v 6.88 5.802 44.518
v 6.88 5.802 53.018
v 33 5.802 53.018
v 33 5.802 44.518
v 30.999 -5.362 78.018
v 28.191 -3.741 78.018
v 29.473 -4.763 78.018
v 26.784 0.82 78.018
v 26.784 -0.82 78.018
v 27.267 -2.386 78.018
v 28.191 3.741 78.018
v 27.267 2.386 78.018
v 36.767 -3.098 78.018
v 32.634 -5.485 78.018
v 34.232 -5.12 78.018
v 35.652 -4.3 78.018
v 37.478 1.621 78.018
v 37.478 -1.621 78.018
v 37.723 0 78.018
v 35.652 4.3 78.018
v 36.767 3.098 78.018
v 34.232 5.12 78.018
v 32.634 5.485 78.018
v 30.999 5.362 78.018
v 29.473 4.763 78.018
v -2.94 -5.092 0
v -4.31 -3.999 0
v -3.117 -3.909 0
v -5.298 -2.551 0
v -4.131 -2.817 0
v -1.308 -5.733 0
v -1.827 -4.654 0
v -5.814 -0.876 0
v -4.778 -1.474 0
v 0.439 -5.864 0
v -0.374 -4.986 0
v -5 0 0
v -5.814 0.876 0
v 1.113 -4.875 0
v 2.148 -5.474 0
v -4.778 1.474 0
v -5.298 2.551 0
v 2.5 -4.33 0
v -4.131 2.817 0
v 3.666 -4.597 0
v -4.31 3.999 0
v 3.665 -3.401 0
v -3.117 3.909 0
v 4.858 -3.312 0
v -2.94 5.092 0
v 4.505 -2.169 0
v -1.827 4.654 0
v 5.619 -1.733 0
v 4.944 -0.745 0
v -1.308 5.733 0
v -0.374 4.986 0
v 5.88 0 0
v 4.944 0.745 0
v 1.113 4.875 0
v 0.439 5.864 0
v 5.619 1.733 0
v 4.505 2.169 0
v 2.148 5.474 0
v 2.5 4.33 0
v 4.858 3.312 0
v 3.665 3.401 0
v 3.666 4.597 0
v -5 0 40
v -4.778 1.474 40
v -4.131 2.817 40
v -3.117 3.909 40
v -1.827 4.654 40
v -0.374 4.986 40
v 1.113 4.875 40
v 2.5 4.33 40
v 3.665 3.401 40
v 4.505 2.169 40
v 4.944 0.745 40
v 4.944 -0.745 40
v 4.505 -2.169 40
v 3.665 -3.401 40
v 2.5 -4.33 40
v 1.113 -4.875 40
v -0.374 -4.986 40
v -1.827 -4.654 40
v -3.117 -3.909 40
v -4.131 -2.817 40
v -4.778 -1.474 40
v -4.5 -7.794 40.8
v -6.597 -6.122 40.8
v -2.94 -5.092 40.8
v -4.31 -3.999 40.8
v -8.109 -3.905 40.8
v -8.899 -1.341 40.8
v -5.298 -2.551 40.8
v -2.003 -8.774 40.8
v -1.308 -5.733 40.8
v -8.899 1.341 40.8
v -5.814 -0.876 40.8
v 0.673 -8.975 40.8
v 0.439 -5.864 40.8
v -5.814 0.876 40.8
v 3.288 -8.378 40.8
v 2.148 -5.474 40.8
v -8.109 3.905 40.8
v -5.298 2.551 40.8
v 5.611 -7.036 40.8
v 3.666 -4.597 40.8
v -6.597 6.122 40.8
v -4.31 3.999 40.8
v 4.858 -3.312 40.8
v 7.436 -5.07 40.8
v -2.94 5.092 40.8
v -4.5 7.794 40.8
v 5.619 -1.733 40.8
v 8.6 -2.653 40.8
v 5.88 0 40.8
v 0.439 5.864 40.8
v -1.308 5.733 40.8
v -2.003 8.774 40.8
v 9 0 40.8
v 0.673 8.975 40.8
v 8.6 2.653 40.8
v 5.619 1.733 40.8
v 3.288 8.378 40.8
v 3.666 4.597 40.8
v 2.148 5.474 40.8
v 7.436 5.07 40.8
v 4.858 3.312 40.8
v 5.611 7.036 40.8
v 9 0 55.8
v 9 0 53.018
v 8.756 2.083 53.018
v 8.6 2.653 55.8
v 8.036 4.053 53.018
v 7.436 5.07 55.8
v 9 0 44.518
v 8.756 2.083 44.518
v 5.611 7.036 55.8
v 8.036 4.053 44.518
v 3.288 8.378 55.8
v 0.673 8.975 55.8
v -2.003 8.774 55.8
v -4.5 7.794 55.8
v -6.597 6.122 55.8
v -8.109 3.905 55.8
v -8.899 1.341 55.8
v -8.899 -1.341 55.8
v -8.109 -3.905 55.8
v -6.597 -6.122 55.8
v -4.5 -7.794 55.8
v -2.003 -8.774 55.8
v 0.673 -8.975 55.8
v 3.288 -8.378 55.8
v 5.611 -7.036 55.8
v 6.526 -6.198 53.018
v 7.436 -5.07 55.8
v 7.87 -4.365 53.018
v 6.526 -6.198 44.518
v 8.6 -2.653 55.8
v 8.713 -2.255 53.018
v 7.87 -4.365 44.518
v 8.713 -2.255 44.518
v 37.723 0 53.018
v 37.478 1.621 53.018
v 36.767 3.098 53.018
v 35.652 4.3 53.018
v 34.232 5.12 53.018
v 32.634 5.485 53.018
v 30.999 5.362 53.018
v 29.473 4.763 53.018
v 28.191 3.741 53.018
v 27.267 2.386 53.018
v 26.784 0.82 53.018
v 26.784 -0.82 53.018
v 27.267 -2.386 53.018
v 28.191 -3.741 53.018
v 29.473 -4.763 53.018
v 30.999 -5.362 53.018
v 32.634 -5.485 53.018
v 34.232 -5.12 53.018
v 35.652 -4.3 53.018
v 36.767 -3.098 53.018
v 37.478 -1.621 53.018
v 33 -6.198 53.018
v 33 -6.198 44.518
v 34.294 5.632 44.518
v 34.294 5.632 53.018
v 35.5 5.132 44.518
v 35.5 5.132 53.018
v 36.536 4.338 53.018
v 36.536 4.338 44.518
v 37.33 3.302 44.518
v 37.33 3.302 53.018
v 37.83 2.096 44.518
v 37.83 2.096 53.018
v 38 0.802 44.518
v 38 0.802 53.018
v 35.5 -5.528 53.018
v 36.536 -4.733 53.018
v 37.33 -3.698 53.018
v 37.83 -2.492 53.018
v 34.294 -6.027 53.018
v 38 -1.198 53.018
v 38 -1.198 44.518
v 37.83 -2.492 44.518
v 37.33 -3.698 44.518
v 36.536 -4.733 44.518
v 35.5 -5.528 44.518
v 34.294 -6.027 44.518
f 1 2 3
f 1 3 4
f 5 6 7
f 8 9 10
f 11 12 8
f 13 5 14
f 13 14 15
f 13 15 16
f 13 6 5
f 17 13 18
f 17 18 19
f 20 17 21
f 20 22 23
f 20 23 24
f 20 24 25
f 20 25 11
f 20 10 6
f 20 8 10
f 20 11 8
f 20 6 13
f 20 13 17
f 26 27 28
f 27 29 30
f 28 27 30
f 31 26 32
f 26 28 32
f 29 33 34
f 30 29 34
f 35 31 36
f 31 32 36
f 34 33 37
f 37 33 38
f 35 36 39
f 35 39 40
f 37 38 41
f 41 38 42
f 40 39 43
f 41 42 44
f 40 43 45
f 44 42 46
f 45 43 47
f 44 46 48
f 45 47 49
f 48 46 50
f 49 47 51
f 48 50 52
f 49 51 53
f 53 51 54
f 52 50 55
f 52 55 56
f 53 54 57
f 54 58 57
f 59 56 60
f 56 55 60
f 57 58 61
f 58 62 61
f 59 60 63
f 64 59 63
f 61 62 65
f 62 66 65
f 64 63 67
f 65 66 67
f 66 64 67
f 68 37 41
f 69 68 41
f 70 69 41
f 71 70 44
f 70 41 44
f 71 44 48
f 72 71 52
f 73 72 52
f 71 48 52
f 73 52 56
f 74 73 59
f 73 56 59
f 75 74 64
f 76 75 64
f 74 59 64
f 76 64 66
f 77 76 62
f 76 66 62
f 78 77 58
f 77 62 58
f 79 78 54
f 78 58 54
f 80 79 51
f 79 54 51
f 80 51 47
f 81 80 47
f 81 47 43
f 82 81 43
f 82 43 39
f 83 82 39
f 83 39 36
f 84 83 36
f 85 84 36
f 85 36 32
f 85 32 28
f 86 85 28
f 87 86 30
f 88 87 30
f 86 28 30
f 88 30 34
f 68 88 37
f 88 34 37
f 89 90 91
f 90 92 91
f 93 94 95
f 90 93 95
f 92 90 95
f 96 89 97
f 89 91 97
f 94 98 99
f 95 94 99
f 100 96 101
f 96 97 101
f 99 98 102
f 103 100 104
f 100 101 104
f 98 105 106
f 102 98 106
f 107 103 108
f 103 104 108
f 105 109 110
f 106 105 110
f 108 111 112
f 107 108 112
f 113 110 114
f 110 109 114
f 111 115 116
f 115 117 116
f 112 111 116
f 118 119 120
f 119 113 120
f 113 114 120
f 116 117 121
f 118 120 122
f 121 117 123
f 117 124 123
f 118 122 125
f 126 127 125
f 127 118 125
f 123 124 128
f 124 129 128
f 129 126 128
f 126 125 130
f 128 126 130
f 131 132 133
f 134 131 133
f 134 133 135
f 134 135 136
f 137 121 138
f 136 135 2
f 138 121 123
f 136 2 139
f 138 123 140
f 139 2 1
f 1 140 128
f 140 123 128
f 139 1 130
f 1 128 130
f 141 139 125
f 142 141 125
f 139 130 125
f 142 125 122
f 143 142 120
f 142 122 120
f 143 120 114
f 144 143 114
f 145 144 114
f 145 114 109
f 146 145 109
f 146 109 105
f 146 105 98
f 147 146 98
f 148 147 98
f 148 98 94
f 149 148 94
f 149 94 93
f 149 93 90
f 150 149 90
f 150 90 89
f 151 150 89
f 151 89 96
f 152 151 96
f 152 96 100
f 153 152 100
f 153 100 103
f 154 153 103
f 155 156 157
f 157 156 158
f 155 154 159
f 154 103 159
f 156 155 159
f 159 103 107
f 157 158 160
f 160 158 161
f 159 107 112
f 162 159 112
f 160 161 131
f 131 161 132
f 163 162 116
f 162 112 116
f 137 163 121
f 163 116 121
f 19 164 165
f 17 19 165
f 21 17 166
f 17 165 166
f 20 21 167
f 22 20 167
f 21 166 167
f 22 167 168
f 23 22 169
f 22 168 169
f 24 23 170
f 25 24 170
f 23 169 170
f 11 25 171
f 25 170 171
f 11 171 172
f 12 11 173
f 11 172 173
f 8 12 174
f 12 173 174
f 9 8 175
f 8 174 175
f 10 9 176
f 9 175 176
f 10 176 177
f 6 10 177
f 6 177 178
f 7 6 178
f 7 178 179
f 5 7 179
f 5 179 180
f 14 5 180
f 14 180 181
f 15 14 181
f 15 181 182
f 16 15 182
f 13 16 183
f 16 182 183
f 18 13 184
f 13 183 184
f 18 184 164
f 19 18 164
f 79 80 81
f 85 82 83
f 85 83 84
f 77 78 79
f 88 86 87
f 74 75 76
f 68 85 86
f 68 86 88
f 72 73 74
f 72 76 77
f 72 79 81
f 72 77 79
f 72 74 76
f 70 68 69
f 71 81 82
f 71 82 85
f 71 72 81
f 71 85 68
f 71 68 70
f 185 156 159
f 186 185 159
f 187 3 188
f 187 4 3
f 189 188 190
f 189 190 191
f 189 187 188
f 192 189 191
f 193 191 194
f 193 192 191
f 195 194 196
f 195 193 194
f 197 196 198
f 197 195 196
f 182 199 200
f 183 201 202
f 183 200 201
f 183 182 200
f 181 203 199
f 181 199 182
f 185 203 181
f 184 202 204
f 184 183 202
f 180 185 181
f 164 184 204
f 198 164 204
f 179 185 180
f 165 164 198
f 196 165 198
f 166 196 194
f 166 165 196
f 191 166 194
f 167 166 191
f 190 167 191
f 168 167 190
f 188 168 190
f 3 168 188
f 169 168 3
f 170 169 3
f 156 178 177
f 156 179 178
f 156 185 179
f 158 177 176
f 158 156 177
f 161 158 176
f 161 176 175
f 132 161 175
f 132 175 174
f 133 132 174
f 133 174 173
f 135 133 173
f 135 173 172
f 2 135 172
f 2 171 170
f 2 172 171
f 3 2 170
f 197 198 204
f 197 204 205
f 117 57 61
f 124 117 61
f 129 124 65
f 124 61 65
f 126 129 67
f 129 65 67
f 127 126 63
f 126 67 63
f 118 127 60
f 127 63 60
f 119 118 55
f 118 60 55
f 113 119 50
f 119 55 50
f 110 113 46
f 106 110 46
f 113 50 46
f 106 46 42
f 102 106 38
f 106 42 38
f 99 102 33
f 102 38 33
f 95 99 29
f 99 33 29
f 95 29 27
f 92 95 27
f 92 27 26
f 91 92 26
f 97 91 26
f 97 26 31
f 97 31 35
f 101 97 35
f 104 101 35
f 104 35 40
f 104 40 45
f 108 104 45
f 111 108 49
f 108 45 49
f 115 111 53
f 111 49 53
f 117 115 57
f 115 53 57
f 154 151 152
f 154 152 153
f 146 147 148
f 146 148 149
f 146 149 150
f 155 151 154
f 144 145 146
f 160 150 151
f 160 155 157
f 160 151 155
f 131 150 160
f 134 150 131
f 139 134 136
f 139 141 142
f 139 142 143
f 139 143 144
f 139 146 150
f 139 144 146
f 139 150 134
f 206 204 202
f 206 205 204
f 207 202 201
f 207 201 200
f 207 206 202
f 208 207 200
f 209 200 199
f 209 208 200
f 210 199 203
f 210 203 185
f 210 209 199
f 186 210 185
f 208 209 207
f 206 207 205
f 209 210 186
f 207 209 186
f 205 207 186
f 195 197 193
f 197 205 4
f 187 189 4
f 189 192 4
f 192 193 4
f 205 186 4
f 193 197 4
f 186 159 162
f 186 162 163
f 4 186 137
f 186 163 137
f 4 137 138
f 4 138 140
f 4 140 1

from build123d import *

# Parameters (mm, degrees)
SKETCH1_R           = 5.88
BOSS_EXTRUDE1_DEPTH = 40.8
SKETCH2_R           = 9
BOSS_EXTRUDE2_DEPTH = 15
SKETCH3_R           = 5
CUT_EXTRUDE1_DEPTH  = 40
SKETCH4_W           = 8.5
SKETCH4_H           = 12
BOSS_EXTRUDE4_DEPTH = 38
SKETCH5_R           = 5.5
BOSS_EXTRUDE5_DEPTH = 25
FILLET1_R           = 5
FILLET2_R           = 5


with BuildPart() as part:
    # Sketch1 → Boss-Extrude1 (new body)
    with BuildSketch(Plane.XY):
        Circle(SKETCH1_R)
    extrude(amount=BOSS_EXTRUDE1_DEPTH)

    # Sketch2 → Boss-Extrude2 (add)
    with BuildSketch(Plane.XY.offset(40.8)):
        Circle(SKETCH2_R)
    extrude(amount=BOSS_EXTRUDE2_DEPTH)

    # Sketch3 → Cut-Extrude1 (cut)
    with BuildSketch(Plane(origin=(0, 0, 0), x_dir=(-1, 0, 0), z_dir=(0, 0, -1))):
        Circle(SKETCH3_R)
    extrude(amount=-CUT_EXTRUDE1_DEPTH, mode=Mode.SUBTRACT)

    # Sketch4 → Boss-Extrude4 (add)
    with BuildSketch(Plane(origin=(0, 0, 0), x_dir=(0, 0, -1), z_dir=(1, 0, 0))):
        with Locations((-48.767868688, -0.197628396)):
            Rectangle(SKETCH4_W, SKETCH4_H)
    extrude(amount=BOSS_EXTRUDE4_DEPTH)

    # Sketch5 → Boss-Extrude5 (add)
    with BuildSketch(Plane.XY.offset(53.017868688)):
        with Locations((32.222684983, 0)):
            Circle(SKETCH5_R)
    extrude(amount=BOSS_EXTRUDE5_DEPTH)

    # Fillet1
    fillet1_edges = [part.edges().sort_by_distance(p)[0] for p in [
        (38, 5.802371604, 48.767868688),
    ]]
    fillet(fillet1_edges, radius=FILLET1_R)

    # Fillet2
    fillet2_edges = [part.edges().sort_by_distance(p)[0] for p in [
        (38, -6.197628396, 48.767868688),
    ]]
    fillet(fillet2_edges, radius=FILLET2_R)


solid = part.part
